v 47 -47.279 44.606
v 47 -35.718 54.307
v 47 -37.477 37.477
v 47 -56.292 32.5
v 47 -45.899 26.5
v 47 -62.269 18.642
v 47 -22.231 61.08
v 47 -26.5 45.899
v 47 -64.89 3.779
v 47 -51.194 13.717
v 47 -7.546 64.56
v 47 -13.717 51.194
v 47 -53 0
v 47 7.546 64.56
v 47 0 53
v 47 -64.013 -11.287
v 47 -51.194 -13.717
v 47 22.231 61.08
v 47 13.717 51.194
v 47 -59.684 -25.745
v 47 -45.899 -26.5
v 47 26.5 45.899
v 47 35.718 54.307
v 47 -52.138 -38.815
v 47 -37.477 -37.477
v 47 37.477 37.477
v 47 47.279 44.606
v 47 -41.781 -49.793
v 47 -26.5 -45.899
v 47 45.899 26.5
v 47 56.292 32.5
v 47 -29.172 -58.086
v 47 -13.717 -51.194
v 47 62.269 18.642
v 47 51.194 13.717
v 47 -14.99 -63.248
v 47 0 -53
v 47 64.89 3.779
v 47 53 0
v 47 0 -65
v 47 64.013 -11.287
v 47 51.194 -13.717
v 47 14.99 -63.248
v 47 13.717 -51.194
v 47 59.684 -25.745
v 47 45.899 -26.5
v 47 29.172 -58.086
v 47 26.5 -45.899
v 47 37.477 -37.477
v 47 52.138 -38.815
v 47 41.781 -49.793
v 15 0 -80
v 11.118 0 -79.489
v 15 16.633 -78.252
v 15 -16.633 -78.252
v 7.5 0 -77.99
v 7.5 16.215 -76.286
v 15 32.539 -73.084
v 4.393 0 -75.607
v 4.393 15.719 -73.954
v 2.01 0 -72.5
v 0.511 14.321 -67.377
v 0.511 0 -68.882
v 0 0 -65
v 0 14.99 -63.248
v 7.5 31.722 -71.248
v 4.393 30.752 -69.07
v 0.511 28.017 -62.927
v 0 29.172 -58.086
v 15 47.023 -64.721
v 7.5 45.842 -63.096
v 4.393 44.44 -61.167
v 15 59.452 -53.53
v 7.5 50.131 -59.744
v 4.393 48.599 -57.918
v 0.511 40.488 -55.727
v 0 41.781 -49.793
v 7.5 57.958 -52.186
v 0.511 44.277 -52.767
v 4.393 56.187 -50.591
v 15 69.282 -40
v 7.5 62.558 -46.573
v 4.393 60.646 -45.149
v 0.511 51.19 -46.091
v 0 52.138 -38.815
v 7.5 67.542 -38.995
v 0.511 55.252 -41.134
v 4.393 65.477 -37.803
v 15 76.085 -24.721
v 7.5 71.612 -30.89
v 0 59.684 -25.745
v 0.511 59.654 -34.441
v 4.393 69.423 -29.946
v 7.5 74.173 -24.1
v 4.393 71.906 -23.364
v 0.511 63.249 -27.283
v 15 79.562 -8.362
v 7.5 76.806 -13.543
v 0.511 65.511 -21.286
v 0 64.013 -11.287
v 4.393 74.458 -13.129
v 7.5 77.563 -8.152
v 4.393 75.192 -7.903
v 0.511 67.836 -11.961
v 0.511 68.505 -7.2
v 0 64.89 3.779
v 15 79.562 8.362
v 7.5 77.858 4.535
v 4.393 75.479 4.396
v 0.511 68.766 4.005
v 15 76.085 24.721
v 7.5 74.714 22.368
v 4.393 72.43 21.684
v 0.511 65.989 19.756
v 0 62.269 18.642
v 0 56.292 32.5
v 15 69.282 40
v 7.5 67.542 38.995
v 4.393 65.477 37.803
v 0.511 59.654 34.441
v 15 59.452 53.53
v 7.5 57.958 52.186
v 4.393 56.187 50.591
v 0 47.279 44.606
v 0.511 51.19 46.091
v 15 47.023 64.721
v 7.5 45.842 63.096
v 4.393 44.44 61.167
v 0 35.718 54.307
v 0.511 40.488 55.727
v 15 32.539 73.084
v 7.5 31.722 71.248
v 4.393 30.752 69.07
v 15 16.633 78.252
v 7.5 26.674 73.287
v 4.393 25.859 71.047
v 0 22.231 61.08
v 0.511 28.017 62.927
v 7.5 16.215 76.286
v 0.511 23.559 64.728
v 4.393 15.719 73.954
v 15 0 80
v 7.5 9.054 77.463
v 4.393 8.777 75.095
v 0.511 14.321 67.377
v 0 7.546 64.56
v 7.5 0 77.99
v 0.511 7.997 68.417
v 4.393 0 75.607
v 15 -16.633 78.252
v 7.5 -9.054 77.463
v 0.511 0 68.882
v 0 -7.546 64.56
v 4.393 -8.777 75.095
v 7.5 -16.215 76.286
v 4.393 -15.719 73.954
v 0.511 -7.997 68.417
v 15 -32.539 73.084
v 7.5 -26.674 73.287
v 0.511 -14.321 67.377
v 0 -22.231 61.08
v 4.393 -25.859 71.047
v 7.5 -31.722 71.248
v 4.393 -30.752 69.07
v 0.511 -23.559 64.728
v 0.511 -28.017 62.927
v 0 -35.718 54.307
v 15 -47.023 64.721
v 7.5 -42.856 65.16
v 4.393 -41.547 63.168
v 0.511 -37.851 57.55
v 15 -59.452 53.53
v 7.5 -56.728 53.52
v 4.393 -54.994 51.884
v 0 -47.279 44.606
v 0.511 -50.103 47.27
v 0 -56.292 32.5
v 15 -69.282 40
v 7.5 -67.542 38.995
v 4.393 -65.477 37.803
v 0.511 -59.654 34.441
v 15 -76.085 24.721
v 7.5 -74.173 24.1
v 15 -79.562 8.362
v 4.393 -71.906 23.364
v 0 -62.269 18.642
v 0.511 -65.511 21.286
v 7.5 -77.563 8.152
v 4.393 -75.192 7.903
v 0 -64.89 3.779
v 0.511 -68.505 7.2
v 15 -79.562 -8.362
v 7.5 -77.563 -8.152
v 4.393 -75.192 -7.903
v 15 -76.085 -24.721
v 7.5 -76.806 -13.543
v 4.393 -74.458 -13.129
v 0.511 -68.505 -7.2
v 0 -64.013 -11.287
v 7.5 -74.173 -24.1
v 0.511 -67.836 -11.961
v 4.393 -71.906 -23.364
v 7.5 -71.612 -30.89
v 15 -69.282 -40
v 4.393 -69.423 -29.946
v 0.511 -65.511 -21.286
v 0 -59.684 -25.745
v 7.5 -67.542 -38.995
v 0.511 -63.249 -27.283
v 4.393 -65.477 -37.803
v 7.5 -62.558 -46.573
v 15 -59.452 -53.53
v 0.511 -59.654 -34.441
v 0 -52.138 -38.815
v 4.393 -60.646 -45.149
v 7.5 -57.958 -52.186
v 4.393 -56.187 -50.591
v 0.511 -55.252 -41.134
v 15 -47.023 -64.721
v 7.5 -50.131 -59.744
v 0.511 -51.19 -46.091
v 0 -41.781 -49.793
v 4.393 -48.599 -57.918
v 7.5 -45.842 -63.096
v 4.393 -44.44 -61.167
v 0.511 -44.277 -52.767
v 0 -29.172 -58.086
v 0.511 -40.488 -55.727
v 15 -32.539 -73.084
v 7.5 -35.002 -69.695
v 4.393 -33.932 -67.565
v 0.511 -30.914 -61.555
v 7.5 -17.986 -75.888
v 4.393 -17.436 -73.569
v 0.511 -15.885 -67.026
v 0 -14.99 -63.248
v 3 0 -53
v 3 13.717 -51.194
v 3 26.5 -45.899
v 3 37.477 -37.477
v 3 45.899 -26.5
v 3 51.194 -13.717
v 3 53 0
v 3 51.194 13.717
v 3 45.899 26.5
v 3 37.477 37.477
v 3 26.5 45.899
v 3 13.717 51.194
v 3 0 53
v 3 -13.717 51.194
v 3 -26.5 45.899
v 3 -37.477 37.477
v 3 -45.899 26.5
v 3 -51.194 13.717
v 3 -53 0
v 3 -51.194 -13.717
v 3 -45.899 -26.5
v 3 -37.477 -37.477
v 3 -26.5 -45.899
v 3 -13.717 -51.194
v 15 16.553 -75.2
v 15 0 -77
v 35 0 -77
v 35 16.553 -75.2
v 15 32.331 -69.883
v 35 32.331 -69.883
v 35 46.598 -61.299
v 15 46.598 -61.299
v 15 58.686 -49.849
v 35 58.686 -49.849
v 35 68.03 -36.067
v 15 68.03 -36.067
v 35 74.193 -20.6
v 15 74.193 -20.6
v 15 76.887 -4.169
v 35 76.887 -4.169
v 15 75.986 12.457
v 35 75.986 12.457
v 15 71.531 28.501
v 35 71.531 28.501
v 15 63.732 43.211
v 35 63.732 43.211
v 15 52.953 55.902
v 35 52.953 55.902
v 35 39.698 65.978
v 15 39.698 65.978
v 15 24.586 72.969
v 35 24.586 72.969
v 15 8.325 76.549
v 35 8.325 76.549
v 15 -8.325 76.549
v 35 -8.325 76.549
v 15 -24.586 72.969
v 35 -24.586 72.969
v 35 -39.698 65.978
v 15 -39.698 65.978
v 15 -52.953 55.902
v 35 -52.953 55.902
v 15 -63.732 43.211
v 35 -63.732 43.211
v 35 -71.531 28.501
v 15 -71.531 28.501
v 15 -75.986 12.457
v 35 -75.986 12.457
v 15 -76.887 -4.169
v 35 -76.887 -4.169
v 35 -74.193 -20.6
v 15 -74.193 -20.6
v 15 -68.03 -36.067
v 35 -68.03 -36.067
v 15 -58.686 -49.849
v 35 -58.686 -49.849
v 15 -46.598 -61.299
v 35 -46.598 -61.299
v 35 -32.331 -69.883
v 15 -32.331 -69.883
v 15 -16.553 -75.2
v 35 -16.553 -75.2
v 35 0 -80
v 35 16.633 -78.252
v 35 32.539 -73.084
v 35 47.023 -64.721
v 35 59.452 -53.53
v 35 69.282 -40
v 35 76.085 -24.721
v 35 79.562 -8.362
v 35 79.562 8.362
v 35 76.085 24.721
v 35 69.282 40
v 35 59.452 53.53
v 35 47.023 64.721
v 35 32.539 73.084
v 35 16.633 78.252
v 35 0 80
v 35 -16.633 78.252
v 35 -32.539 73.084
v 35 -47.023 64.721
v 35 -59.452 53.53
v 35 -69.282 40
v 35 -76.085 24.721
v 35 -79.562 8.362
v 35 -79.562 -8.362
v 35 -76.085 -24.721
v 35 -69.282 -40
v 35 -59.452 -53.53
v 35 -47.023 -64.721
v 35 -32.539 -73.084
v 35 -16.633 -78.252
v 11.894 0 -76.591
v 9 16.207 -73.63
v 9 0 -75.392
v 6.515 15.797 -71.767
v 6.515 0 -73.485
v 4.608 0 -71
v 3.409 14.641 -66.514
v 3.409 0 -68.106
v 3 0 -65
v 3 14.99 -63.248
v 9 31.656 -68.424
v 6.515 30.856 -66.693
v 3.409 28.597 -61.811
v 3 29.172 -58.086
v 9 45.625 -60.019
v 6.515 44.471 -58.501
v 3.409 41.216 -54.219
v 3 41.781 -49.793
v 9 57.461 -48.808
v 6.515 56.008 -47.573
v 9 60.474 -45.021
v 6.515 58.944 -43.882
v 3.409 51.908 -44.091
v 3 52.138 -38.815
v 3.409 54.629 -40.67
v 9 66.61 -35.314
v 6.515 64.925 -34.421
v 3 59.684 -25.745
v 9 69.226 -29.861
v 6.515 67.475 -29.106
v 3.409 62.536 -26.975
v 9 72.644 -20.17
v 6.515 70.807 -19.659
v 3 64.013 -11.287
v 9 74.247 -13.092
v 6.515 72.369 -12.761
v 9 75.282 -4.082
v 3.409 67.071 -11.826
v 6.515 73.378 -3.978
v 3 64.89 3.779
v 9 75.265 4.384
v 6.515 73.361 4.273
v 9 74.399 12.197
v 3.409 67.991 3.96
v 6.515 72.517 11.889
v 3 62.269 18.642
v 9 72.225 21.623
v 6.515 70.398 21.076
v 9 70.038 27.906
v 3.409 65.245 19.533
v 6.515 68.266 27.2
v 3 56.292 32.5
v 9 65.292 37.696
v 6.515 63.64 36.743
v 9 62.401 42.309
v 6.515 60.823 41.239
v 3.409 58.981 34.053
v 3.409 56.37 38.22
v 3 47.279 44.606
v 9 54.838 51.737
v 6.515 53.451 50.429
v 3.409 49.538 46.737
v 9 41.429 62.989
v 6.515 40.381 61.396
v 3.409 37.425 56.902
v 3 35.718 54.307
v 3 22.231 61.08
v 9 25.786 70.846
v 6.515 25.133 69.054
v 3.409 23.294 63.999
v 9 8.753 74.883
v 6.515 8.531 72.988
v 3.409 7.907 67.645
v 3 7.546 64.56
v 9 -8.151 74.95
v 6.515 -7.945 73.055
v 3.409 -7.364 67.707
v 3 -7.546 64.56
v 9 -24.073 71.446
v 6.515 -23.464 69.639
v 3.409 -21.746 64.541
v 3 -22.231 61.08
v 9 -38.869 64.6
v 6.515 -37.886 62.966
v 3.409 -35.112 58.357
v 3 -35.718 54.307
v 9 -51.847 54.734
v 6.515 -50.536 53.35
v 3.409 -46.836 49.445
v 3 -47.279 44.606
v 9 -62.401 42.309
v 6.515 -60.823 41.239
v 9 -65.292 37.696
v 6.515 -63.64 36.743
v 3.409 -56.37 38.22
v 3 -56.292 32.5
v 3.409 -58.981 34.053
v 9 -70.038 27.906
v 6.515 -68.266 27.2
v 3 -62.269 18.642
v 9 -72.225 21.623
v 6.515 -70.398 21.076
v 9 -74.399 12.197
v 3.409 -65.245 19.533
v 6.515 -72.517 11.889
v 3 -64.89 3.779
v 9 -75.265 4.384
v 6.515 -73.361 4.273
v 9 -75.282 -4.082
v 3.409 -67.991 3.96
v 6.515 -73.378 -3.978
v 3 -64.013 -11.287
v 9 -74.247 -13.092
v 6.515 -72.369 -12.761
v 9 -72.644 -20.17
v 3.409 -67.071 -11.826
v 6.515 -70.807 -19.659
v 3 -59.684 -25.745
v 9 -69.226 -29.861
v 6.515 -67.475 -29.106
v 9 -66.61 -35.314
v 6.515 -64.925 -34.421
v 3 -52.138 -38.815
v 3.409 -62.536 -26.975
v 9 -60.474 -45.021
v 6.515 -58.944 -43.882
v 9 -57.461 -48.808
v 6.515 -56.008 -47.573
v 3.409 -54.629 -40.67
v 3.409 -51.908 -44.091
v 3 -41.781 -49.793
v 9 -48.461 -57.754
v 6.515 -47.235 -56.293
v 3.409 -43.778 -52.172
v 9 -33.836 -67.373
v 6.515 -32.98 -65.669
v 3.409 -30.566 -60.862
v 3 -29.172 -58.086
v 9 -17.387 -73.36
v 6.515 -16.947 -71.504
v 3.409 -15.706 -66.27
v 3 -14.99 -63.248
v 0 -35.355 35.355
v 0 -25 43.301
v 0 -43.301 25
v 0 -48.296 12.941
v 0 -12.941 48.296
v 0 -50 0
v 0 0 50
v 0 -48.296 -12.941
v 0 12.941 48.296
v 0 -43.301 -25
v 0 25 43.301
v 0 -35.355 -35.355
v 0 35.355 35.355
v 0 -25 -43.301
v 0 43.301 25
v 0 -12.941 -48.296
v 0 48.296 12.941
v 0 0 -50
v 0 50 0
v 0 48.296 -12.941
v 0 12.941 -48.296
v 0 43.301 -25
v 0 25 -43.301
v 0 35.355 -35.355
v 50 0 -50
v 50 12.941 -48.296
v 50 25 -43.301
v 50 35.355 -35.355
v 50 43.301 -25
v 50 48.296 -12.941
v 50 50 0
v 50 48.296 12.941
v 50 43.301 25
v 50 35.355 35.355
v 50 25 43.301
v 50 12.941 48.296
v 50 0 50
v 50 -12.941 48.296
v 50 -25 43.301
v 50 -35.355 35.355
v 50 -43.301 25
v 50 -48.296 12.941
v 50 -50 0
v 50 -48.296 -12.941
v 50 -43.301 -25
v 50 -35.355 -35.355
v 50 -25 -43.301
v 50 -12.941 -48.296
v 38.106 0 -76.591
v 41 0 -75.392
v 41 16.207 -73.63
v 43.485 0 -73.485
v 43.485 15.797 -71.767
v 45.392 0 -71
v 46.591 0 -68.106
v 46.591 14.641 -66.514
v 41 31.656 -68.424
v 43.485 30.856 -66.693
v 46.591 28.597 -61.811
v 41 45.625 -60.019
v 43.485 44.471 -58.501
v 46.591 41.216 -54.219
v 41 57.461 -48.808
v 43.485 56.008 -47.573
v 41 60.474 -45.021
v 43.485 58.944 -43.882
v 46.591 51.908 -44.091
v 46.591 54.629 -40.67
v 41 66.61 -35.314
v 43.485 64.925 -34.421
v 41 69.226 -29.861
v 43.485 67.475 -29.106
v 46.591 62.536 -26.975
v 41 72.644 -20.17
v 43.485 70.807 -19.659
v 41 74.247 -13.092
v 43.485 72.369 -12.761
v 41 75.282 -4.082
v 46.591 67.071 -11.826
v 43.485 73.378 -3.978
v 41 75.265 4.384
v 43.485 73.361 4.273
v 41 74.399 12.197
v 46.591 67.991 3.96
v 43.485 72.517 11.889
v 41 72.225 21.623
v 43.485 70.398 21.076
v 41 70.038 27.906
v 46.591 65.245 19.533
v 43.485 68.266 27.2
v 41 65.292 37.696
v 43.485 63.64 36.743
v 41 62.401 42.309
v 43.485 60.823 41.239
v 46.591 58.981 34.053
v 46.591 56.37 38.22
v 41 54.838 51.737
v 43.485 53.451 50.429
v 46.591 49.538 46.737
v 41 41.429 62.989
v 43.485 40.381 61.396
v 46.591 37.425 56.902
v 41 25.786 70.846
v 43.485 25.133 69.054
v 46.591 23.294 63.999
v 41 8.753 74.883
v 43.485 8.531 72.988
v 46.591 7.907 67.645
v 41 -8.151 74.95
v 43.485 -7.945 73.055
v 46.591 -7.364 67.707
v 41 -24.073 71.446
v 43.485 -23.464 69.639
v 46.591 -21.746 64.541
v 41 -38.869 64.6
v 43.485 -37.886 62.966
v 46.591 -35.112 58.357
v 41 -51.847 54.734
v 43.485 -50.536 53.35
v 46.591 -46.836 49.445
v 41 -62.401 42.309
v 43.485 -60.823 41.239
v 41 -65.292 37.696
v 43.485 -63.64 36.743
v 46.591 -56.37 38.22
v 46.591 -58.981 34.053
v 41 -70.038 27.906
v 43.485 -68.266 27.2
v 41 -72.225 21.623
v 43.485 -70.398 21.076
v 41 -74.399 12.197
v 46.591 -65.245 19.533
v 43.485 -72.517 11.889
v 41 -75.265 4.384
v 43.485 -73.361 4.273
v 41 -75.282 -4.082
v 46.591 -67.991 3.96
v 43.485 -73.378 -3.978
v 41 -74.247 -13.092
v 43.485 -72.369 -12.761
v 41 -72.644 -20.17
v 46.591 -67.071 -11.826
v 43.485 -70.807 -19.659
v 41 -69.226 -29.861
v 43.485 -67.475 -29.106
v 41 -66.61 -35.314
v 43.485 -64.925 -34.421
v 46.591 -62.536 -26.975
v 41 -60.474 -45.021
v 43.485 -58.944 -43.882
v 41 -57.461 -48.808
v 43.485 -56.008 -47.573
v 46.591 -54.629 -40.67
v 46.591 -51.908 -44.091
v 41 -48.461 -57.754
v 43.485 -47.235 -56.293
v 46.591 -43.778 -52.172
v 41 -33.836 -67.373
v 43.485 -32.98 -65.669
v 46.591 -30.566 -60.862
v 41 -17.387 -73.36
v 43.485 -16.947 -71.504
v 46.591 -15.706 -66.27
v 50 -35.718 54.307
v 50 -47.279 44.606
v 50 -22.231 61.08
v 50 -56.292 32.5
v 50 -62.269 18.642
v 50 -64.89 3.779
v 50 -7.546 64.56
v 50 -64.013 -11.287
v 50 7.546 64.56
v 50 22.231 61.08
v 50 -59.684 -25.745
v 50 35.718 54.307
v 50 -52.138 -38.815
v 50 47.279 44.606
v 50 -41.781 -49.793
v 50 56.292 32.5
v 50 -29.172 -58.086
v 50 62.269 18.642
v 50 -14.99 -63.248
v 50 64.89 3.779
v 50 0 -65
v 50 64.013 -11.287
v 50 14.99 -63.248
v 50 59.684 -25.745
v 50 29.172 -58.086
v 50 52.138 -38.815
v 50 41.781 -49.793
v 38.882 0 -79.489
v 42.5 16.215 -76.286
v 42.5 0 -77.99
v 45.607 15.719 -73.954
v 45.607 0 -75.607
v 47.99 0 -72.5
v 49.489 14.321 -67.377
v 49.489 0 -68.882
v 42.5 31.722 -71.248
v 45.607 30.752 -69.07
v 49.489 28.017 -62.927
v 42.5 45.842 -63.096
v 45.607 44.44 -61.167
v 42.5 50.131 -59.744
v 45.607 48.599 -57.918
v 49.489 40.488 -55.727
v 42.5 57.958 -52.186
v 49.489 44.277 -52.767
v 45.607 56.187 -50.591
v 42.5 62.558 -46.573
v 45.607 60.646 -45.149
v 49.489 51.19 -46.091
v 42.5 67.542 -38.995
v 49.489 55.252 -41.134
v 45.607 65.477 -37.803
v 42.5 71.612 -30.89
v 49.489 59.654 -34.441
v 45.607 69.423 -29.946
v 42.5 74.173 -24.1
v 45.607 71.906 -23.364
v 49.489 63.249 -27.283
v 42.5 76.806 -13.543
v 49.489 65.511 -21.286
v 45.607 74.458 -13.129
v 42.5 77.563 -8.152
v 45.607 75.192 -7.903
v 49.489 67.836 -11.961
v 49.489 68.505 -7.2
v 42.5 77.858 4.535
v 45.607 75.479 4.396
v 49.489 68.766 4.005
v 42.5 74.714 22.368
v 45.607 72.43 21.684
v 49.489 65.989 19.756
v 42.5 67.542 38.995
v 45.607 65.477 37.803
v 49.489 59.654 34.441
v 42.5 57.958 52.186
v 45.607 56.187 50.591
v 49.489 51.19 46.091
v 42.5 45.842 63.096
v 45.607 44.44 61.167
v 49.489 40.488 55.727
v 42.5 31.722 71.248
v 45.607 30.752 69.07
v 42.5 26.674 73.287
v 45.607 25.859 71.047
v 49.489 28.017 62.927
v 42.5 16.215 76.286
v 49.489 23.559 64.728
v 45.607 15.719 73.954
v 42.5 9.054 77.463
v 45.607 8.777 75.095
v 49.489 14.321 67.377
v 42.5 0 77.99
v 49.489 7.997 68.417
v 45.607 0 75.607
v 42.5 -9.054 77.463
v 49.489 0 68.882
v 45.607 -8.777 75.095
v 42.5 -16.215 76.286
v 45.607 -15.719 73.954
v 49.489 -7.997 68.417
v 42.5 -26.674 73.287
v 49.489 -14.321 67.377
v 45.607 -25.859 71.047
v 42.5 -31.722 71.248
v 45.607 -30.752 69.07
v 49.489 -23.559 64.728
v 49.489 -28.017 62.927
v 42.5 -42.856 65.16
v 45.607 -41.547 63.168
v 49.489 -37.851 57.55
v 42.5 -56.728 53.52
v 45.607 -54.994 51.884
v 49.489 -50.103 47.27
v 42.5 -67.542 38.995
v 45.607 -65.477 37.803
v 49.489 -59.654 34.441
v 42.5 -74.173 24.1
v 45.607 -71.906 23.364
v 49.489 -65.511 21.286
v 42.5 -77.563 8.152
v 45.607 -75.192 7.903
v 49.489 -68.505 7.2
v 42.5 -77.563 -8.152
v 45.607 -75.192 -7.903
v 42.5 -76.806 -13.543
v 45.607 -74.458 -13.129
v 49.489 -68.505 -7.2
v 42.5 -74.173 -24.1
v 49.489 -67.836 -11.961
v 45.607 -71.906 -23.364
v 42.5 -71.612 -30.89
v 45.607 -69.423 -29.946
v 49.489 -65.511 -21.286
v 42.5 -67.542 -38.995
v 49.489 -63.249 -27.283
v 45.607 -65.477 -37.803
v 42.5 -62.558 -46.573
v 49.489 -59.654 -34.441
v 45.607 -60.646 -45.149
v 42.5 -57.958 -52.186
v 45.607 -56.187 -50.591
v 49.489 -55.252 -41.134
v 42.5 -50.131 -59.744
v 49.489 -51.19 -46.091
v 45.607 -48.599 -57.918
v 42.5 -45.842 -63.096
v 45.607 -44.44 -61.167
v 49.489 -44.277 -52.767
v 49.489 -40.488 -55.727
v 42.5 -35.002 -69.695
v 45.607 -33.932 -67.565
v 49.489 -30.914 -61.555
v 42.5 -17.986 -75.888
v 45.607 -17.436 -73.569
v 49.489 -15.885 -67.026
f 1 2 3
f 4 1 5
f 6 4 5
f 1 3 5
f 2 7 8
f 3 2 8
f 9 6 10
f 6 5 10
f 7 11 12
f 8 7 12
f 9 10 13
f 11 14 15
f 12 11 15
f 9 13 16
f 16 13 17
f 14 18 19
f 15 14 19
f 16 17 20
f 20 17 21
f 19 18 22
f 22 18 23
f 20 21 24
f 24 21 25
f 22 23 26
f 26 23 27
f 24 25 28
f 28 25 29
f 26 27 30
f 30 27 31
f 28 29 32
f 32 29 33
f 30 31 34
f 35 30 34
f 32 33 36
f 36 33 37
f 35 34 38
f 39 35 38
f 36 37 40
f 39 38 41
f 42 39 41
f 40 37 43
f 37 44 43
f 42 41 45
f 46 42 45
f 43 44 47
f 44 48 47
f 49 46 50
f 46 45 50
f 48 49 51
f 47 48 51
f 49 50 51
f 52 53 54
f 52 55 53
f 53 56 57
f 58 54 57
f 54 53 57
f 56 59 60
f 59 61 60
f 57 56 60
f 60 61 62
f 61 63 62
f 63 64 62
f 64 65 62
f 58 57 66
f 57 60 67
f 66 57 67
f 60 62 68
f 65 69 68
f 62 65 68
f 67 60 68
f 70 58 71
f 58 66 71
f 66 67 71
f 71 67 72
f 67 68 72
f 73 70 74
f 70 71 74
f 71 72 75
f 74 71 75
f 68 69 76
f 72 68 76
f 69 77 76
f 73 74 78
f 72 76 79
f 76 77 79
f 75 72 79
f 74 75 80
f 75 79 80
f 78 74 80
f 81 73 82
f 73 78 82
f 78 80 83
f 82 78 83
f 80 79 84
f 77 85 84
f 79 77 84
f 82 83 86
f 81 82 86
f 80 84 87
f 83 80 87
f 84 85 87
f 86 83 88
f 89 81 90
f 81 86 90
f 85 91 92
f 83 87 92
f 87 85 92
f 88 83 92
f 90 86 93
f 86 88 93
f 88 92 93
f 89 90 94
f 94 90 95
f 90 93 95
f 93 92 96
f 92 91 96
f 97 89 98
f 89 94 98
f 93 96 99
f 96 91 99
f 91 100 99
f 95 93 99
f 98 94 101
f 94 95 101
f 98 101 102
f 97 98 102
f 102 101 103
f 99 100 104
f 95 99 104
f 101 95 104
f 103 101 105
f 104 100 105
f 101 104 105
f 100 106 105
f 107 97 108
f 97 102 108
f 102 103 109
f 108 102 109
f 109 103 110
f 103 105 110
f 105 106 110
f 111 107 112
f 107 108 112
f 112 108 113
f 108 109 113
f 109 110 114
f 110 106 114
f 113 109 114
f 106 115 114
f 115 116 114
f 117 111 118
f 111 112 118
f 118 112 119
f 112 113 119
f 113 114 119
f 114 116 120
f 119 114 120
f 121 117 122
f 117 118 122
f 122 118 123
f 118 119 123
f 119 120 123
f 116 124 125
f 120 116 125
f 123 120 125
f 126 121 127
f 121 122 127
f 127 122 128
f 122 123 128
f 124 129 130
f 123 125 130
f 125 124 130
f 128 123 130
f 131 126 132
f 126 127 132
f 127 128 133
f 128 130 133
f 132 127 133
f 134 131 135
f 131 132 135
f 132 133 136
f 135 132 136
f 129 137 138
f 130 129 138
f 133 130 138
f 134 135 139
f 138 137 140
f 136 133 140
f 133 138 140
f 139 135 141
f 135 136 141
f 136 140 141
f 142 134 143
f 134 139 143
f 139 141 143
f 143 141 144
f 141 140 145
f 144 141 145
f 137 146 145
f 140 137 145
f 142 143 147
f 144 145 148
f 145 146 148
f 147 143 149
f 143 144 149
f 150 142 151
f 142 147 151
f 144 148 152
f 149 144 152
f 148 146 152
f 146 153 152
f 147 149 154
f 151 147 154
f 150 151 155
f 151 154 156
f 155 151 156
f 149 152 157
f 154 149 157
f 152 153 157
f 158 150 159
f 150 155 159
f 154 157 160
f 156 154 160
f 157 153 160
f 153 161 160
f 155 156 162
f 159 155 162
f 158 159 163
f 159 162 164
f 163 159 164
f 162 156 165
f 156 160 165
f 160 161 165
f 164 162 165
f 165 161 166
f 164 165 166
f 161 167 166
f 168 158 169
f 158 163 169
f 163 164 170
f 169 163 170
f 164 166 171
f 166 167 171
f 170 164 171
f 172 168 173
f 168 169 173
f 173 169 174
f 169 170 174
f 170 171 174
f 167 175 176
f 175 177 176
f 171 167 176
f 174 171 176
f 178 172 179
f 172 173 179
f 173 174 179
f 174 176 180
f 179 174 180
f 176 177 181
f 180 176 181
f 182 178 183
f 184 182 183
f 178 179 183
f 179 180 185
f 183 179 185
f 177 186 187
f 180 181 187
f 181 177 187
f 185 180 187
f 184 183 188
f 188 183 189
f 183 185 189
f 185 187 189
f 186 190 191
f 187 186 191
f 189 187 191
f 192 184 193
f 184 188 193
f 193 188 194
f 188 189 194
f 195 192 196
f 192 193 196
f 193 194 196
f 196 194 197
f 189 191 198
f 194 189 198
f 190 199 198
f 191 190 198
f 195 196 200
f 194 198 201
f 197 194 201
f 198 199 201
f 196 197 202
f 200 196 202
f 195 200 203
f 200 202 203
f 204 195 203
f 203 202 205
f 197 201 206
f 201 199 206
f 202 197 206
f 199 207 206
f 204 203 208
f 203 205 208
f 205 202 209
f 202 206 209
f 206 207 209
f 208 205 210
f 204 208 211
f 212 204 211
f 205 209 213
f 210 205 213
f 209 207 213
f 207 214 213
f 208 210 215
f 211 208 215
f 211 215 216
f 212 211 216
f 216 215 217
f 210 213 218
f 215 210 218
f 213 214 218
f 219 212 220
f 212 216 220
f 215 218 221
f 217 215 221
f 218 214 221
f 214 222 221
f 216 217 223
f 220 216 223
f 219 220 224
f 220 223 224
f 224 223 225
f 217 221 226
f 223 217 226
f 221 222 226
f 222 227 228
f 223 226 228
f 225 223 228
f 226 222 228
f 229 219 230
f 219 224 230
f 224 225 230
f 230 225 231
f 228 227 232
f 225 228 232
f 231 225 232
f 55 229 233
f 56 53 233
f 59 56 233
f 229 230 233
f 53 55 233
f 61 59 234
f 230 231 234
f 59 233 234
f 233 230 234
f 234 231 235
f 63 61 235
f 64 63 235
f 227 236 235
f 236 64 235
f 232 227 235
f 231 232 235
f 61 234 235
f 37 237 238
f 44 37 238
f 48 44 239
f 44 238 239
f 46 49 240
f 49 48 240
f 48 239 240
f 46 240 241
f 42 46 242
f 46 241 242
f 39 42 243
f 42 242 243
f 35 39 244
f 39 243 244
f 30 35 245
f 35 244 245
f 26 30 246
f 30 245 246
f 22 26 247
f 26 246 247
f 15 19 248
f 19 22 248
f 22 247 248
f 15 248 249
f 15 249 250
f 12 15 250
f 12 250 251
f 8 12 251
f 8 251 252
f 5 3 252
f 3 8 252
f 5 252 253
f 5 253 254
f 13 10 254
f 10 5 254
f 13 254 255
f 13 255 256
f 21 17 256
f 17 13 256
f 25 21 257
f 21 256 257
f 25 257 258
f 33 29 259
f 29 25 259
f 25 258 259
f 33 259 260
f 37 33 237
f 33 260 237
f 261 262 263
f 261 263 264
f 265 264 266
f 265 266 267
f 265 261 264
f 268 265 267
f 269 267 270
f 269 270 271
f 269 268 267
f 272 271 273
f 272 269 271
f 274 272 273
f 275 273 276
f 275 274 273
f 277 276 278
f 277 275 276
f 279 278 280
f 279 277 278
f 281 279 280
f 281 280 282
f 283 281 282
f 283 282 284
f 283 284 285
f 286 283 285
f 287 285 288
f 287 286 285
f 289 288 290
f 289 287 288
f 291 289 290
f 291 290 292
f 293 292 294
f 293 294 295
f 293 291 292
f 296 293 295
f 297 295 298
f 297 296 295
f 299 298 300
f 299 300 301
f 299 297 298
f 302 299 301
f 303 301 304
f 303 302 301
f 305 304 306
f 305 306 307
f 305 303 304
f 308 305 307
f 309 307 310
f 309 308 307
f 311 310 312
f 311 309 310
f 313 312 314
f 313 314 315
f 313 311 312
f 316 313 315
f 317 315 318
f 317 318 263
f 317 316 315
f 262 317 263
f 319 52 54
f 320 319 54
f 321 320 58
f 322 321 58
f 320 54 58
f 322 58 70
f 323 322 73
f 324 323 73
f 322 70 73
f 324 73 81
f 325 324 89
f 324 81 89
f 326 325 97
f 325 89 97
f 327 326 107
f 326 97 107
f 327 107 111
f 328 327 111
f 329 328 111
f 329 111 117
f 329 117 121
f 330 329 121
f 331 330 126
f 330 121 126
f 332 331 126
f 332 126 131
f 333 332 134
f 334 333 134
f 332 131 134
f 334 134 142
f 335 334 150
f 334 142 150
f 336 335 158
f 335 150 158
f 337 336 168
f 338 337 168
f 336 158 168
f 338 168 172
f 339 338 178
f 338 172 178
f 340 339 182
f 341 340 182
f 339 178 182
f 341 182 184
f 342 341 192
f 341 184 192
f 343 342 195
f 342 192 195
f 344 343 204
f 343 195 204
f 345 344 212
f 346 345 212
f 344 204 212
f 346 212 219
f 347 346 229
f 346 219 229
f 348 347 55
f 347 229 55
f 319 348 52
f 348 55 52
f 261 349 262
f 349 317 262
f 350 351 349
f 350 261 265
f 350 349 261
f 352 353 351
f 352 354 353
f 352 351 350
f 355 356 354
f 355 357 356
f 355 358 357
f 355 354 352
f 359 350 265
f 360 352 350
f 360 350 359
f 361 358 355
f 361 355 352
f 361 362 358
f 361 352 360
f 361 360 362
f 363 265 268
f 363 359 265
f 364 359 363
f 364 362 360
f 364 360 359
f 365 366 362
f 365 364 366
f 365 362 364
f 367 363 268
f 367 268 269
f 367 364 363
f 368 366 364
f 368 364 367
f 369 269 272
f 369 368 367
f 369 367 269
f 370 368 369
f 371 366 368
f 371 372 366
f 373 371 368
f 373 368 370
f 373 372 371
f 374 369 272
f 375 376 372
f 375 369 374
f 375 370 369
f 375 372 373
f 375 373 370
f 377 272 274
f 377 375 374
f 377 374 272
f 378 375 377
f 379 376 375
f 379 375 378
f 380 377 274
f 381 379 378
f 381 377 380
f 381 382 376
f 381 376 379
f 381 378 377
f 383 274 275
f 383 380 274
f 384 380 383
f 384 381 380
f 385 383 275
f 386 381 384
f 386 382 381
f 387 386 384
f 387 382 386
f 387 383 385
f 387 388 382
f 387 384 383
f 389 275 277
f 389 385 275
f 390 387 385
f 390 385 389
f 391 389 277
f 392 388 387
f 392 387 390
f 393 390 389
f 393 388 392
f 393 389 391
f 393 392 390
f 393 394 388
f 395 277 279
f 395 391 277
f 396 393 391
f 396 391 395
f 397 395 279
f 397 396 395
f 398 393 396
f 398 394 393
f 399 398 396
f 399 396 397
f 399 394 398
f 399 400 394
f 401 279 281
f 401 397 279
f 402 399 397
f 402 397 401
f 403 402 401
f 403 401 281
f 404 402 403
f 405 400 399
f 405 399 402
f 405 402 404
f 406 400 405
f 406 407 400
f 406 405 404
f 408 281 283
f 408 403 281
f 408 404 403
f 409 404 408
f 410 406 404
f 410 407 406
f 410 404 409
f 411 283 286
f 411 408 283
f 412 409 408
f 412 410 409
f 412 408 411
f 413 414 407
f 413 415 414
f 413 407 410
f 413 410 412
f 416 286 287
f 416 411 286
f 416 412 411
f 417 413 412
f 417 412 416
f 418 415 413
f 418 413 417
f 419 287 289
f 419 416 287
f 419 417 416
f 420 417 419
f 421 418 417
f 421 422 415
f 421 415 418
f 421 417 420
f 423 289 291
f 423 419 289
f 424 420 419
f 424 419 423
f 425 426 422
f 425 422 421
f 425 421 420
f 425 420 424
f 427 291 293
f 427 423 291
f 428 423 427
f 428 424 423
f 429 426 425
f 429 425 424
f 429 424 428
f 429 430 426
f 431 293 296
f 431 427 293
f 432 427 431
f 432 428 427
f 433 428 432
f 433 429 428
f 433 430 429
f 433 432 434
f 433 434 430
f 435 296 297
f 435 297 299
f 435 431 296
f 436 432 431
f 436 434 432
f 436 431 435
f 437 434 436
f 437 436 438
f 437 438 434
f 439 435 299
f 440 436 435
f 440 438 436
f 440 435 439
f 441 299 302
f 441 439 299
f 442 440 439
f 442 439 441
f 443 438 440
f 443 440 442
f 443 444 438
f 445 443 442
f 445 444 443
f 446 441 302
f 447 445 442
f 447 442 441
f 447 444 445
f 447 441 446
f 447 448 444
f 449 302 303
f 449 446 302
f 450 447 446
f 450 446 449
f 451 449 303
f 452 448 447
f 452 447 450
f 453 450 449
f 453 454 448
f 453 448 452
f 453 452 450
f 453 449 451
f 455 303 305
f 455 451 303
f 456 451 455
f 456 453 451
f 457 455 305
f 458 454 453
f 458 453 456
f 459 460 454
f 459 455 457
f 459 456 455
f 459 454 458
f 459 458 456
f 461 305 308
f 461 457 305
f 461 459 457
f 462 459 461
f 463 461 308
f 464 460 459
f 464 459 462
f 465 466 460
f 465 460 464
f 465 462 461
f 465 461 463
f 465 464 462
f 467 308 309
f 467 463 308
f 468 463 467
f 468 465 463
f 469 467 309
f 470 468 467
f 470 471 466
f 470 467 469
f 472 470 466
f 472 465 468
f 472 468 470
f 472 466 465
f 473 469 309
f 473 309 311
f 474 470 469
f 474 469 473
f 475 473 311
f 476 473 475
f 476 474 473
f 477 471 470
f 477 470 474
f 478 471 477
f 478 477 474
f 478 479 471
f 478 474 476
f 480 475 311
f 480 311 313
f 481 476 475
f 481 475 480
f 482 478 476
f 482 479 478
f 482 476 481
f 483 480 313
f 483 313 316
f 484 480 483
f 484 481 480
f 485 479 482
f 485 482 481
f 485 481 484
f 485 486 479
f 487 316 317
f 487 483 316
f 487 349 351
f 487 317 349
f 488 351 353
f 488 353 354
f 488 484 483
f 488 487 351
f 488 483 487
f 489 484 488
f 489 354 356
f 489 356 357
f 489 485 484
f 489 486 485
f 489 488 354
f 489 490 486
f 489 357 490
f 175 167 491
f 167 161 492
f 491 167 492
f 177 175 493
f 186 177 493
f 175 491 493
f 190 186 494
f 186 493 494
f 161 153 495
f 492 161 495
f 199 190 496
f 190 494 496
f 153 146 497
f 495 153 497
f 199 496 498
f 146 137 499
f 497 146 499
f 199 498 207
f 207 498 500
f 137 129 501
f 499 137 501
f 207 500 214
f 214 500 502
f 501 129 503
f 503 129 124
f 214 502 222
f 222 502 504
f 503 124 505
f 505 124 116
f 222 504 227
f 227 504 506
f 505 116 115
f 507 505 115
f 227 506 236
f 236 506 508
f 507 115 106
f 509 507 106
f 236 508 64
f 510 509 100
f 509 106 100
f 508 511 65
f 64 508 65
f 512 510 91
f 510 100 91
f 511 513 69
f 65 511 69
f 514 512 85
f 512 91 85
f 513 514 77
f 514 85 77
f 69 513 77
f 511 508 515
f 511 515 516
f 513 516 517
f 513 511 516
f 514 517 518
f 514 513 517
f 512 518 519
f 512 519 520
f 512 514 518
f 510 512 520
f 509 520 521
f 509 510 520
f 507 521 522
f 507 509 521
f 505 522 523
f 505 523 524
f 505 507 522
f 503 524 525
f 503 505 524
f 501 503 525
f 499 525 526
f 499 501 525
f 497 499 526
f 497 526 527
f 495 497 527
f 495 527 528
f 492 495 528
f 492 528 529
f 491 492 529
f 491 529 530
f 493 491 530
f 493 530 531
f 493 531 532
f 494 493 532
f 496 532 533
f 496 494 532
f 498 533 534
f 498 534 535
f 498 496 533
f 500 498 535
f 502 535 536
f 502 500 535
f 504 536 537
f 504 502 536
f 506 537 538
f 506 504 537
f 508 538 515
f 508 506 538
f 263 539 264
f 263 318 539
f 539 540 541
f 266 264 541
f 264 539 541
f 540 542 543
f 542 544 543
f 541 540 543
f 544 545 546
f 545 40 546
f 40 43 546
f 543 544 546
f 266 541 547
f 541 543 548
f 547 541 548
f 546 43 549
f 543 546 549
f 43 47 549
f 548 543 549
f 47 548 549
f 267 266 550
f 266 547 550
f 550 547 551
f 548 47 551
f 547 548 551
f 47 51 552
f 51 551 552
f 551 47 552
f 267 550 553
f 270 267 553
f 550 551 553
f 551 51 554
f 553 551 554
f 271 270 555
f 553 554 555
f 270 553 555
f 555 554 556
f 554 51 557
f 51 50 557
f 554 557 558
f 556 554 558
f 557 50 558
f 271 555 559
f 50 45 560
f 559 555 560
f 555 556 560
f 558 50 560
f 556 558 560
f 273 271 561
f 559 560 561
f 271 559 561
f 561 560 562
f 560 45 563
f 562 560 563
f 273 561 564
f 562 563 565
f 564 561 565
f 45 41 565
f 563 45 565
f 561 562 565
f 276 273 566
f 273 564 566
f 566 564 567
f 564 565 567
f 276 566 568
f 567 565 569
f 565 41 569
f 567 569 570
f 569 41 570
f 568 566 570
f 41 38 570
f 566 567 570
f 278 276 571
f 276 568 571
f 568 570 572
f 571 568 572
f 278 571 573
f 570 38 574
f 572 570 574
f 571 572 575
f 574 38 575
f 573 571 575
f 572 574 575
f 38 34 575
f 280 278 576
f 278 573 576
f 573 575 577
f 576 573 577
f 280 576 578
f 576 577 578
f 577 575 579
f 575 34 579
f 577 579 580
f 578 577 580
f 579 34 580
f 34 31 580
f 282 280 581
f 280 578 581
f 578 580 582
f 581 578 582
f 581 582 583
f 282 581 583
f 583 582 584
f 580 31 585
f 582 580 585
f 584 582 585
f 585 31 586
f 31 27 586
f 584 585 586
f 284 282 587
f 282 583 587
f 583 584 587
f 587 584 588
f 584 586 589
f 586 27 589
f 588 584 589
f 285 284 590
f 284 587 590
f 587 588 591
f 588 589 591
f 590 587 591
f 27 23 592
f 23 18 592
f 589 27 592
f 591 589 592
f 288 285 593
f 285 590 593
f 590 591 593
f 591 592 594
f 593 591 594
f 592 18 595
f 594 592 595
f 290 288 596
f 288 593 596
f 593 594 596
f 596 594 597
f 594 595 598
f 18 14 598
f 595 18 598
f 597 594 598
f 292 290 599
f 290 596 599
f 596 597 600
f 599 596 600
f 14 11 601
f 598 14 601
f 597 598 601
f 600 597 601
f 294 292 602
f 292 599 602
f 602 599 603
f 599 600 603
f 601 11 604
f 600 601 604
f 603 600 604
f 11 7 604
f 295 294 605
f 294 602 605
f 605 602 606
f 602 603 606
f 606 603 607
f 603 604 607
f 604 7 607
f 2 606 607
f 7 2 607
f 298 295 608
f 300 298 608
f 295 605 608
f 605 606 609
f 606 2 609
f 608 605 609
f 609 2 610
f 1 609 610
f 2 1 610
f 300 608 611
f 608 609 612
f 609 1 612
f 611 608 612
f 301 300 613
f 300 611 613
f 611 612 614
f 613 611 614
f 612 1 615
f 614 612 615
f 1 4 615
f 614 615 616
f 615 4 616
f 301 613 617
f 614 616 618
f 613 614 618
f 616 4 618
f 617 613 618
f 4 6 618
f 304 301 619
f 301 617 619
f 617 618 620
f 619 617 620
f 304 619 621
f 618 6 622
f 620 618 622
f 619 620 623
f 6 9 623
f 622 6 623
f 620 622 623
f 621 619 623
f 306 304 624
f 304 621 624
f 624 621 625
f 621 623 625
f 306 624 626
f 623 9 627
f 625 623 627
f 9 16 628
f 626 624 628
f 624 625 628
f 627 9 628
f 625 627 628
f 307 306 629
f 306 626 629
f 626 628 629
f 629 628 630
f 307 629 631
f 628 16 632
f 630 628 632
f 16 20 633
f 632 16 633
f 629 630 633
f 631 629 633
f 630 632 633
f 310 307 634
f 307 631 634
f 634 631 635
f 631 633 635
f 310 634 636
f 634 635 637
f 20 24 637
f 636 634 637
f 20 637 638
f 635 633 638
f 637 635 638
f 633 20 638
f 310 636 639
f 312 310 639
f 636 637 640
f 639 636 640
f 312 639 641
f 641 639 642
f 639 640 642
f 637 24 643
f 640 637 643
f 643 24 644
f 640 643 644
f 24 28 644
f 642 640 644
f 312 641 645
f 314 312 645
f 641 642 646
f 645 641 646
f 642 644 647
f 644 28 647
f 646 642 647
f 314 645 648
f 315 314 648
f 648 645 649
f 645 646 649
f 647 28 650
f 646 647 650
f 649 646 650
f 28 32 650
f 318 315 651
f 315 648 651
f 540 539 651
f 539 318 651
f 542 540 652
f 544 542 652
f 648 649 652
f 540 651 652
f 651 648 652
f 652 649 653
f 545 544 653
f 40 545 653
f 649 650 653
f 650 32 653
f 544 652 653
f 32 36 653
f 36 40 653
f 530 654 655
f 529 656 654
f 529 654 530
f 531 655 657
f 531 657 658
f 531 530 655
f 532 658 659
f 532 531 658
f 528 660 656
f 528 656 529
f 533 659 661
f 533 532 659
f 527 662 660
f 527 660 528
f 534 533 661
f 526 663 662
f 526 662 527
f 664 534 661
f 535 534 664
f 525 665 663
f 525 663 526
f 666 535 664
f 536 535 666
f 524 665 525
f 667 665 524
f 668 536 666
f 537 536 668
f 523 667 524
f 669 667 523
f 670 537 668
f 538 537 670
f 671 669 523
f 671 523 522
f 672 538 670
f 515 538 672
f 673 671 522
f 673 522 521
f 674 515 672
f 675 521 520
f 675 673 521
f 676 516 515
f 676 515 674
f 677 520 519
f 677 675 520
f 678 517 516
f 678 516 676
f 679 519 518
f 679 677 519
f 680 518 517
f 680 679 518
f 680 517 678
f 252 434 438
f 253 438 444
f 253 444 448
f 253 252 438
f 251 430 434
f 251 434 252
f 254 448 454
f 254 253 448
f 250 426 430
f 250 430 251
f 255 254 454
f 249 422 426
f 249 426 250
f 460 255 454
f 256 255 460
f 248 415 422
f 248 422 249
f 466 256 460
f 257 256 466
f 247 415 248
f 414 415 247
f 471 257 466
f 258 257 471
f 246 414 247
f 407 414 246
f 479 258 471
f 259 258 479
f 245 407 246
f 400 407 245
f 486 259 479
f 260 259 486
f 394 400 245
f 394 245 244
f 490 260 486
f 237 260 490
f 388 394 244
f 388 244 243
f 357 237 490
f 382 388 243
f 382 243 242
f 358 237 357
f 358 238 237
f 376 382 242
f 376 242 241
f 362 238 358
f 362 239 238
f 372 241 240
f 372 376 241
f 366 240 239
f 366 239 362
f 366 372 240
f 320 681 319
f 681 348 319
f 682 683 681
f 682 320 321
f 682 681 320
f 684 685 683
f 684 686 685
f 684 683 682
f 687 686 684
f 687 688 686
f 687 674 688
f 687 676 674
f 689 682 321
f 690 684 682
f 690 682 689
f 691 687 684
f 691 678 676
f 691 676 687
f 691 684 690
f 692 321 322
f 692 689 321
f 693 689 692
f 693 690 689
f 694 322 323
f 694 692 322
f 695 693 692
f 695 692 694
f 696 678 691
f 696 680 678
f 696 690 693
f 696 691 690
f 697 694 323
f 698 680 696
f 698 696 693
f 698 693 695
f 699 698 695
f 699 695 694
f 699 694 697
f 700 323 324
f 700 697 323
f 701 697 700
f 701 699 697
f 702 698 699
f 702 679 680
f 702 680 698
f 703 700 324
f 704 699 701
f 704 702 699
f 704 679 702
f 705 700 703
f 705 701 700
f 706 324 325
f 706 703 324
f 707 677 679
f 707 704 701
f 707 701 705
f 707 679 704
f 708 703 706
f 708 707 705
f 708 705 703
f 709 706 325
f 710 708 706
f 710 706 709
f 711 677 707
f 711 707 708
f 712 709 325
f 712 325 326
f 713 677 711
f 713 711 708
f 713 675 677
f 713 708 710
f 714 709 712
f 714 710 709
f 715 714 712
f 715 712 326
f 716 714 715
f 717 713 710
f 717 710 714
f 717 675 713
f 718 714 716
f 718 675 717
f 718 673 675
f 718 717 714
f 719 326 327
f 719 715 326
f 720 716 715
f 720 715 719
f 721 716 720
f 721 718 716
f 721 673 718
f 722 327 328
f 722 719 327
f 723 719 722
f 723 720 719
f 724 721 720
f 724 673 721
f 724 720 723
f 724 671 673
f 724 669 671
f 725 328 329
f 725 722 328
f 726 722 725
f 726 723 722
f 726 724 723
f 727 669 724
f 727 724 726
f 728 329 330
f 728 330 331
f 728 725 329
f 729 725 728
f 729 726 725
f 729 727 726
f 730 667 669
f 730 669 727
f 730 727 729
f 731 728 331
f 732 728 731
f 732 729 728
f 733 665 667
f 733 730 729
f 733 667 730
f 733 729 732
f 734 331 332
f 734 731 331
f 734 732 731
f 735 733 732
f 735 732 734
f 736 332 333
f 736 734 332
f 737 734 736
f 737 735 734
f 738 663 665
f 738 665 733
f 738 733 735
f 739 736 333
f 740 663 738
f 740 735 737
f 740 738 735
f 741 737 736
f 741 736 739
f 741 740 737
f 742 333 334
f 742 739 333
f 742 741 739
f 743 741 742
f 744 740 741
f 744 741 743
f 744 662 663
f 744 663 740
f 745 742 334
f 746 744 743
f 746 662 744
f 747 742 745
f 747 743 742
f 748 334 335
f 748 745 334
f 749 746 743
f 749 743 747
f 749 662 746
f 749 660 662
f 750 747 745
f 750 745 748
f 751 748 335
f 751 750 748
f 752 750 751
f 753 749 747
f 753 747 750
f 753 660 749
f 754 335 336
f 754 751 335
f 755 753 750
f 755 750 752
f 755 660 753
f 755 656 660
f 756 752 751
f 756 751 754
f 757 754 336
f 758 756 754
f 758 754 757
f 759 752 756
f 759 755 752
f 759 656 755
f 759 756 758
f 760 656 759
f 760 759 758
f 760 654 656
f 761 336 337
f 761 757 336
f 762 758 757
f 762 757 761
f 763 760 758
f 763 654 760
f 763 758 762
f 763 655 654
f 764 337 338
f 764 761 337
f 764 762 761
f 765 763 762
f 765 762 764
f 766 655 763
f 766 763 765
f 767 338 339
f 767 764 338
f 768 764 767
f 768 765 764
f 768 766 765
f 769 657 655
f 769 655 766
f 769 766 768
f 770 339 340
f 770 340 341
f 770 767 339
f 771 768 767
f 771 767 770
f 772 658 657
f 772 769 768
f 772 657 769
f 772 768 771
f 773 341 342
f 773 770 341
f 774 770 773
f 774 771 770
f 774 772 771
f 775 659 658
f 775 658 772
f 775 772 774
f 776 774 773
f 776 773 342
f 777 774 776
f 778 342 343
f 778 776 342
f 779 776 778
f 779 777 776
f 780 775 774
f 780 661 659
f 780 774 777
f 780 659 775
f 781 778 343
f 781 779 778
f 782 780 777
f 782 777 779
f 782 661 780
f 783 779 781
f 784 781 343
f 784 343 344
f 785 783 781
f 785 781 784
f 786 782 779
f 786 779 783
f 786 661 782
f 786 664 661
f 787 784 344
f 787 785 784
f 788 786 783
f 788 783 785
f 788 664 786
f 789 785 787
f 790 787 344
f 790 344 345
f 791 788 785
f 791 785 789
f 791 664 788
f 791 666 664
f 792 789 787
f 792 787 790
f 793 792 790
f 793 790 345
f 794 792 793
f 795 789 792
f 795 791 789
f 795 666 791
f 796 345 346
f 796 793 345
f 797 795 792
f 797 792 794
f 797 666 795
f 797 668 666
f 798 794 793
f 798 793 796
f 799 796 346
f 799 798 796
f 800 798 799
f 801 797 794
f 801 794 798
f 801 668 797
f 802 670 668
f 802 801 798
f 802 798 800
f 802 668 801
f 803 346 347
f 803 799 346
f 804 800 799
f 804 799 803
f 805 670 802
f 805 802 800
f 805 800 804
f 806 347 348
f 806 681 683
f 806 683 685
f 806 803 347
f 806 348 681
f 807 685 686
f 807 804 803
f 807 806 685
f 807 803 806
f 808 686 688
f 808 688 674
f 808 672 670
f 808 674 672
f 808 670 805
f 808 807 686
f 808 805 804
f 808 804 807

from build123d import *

# Parameters (mm, degrees)
ESBO_O1_R                = 80
ESBO_O1_R_2              = 50
RESSALTO_EXTRUS_O1_DEPTH = 50
FILETE1_R                = 15
CASCA1_T                 = 3


with BuildPart() as part:
    # Esboço1 → Ressalto-extrusão1 (new body)
    with BuildSketch(Plane(origin=(0, 0, 0), x_dir=(0, 0, -1), z_dir=(1, 0, 0))):
        Circle(ESBO_O1_R)
        Circle(ESBO_O1_R_2, mode=Mode.SUBTRACT)
    extrude(amount=RESSALTO_EXTRUS_O1_DEPTH)

    # Filete1
    filete1_edges = [part.edges().sort_by_distance(p)[0] for p in [
        (50, 0, 80),
        (0, 0, 80),
    ]]
    fillet(filete1_edges, radius=FILETE1_R)

    # Casca1 (no face opened: a closed hollow body)
    add(offset(amount=-CASCA1_T, mode=Mode.PRIVATE), mode=Mode.SUBTRACT)


solid = part.part
